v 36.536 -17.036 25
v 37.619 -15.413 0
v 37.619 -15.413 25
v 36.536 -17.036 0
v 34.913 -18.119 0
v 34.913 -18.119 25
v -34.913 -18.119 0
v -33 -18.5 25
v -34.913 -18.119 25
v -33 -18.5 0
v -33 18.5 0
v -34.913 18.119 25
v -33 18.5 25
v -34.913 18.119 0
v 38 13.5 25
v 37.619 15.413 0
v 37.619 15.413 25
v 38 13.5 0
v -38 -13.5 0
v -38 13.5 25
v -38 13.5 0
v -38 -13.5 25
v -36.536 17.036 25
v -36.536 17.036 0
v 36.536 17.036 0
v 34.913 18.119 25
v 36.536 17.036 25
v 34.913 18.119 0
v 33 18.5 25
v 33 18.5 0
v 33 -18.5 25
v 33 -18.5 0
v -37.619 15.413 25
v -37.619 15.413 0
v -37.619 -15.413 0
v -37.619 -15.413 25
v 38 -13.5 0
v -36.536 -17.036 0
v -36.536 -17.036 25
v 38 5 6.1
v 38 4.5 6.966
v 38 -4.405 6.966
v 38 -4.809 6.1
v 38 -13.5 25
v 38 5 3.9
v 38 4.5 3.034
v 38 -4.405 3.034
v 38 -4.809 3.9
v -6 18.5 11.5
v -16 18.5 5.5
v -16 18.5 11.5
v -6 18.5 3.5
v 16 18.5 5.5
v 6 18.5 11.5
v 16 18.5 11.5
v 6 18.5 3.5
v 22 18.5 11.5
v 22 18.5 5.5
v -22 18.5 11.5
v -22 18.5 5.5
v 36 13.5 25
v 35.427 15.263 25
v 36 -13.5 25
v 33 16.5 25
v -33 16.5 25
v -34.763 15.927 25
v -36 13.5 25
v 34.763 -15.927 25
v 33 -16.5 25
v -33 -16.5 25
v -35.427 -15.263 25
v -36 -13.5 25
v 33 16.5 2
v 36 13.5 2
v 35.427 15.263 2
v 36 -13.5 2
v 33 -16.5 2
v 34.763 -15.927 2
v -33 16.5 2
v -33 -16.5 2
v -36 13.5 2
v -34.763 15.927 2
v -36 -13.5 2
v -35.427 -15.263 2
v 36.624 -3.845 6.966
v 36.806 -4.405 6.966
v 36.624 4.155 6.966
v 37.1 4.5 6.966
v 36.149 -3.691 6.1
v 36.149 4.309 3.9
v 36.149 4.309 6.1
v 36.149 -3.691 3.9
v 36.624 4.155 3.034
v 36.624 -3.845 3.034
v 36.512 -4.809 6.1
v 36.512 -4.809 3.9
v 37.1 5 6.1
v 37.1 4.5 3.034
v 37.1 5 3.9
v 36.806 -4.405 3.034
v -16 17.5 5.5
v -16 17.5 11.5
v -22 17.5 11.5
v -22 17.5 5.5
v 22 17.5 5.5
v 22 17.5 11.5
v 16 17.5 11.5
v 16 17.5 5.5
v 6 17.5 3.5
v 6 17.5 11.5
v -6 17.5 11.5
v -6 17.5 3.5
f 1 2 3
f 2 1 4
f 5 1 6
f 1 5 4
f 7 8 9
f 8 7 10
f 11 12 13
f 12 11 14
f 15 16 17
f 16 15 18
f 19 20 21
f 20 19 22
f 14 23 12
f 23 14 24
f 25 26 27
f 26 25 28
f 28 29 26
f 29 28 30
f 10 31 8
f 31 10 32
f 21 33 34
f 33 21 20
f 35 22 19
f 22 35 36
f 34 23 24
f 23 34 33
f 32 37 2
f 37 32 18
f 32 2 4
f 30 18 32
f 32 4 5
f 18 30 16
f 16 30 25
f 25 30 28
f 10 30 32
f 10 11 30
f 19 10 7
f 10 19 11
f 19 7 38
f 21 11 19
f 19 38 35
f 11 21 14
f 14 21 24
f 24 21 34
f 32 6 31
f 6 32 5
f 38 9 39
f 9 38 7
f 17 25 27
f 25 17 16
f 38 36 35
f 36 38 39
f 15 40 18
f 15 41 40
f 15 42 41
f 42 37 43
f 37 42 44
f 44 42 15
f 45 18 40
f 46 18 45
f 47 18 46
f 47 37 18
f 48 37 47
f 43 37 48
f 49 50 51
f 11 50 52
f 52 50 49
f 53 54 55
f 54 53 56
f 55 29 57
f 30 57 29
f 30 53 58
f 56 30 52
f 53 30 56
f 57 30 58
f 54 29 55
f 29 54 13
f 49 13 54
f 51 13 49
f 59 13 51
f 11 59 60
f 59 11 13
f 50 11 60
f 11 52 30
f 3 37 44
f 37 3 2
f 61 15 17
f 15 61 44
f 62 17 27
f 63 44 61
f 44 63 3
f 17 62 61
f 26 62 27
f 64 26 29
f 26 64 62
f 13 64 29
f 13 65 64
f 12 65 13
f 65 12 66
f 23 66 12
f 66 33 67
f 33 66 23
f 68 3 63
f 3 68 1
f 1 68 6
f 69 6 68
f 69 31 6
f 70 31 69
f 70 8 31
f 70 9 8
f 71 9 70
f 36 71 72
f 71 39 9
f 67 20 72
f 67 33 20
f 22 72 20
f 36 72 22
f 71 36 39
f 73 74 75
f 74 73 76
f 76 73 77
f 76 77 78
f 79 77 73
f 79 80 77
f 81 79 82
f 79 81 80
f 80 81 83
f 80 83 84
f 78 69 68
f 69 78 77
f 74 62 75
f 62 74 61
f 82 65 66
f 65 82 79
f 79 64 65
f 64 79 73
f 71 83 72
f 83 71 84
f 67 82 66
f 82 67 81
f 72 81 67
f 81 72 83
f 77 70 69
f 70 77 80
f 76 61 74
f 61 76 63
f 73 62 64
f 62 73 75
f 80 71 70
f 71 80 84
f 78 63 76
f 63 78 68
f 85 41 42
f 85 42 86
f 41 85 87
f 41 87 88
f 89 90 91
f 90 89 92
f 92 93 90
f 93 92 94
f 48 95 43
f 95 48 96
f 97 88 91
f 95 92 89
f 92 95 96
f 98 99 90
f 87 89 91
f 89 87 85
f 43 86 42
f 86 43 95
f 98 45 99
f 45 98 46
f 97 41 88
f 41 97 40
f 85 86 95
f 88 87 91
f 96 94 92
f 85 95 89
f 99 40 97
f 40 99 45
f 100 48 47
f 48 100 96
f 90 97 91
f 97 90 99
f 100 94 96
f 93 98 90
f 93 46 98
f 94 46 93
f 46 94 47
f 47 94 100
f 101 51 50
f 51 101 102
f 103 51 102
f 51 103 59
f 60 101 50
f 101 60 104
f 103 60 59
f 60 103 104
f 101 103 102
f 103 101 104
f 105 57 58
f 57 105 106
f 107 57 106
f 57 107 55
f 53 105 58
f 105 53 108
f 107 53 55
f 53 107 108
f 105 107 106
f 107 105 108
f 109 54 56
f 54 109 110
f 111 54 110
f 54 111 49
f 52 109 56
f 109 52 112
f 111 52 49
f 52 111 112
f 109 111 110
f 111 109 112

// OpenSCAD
// Parameters
length = 76;            // Outer length of the box
width = 37;             // Outer width of the box
height = 25;            // Height of the box
wall_thickness = 2;     // Thickness of the walls (returned to 2mm)
corner_radius = 5;      // Radius of the outer corners

// USB Type-C hole parameters
usb_width = 10;         // Width of the USB Type-C hole
usb_height = 4;         // Height of the USB Type-C hole
usb_corner_radius = 1;  // Corner radius for the USB hole (optional)
usb_position_y = 0;     // Y position (centered vertically on the side wall)
usb_position_z = wall_thickness + usb_height / 2 + 1; // Near bottom edge

// Push button hole parameters
button_size = 6;        // Size of the push button holes (6mm x 6mm)
button1_position_x = -length / 4;  // Position of the first button hole
button2_position_x = length / 4;   // Position of the second button hole
button_position_z = (height / 2) - 4;    // Centered vertically

// New hole parameters
new_hole_width = 12;        // Width of the new hole (along the x-axis)
new_hole_height = 8;      // Height of the new hole (along the z-axis)
new_hole_position_x = 0;   // Position of the new hole along the x-axis (centered between existing holes)
new_hole_position_z = button_position_z - 1; // Vertical position (same as existing holes)

// Tolerance for proper subtraction
epsilon = 0.1;          // Small offset to ensure clean subtraction

// Calculate inner_corner_radius and handle corner_radius < wall_thickness
if (corner_radius < wall_thickness) {
    echo("Error: corner_radius must be greater than or equal to wall_thickness");
    corner_radius = wall_thickness; // Set corner_radius to wall_thickness to avoid negative values
}
inner_corner_radius = corner_radius - wall_thickness;

difference() {
    // Outer box with rounded corners
    linear_extrude(height)
        rounded_rectangle(length, width, corner_radius);

    // Inner box to create the hollow space
    translate([0, 0, wall_thickness])
        linear_extrude(height - wall_thickness)
            rounded_rectangle(length - 2 * wall_thickness, width - 2 * wall_thickness, inner_corner_radius);

    // USB Type-C hole on the longer side, near the bottom edge
    translate([length / 2 + epsilon, usb_position_y, usb_position_z])
        rotate([0, 0, 90]) // Rotate to align with the side wall
            usb_hole();

    // Push button holes on one of the sides
    // First button hole
    translate([button1_position_x, width / 2 + epsilon, button_position_z])
        cube([button_size, wall_thickness + 2 * epsilon, button_size], center=true);

    // Second button hole
    translate([button2_position_x, width / 2 + epsilon, button_position_z])
        cube([button_size, wall_thickness + 2 * epsilon, button_size], center=true);

    // New rectangular hole between the two existing holes
    translate([new_hole_position_x, width / 2 + epsilon, new_hole_position_z])
        cube([new_hole_width, wall_thickness + 2 * epsilon, new_hole_height], center=true);
}

// Module to create a rounded rectangle
module rounded_rectangle(len, wid, rad) {
    rad = min(rad, len / 2, wid / 2); // Ensure radius does not exceed half the length or width
    offset(r=rad)
        square([len - 2 * rad, wid - 2 * rad], center=true);
}

// Module for the USB Type-C hole
module usb_hole() {
    if (usb_corner_radius > 0) {
        minkowski() {
            cube([usb_width - 2 * usb_corner_radius, usb_height - 2 * usb_corner_radius, wall_thickness + 2 * epsilon], center=true);
            sphere(r=usb_corner_radius);
        }
    } else {
        cube([usb_width, usb_height, wall_thickness + 2 * epsilon], center=true);
    }
}
